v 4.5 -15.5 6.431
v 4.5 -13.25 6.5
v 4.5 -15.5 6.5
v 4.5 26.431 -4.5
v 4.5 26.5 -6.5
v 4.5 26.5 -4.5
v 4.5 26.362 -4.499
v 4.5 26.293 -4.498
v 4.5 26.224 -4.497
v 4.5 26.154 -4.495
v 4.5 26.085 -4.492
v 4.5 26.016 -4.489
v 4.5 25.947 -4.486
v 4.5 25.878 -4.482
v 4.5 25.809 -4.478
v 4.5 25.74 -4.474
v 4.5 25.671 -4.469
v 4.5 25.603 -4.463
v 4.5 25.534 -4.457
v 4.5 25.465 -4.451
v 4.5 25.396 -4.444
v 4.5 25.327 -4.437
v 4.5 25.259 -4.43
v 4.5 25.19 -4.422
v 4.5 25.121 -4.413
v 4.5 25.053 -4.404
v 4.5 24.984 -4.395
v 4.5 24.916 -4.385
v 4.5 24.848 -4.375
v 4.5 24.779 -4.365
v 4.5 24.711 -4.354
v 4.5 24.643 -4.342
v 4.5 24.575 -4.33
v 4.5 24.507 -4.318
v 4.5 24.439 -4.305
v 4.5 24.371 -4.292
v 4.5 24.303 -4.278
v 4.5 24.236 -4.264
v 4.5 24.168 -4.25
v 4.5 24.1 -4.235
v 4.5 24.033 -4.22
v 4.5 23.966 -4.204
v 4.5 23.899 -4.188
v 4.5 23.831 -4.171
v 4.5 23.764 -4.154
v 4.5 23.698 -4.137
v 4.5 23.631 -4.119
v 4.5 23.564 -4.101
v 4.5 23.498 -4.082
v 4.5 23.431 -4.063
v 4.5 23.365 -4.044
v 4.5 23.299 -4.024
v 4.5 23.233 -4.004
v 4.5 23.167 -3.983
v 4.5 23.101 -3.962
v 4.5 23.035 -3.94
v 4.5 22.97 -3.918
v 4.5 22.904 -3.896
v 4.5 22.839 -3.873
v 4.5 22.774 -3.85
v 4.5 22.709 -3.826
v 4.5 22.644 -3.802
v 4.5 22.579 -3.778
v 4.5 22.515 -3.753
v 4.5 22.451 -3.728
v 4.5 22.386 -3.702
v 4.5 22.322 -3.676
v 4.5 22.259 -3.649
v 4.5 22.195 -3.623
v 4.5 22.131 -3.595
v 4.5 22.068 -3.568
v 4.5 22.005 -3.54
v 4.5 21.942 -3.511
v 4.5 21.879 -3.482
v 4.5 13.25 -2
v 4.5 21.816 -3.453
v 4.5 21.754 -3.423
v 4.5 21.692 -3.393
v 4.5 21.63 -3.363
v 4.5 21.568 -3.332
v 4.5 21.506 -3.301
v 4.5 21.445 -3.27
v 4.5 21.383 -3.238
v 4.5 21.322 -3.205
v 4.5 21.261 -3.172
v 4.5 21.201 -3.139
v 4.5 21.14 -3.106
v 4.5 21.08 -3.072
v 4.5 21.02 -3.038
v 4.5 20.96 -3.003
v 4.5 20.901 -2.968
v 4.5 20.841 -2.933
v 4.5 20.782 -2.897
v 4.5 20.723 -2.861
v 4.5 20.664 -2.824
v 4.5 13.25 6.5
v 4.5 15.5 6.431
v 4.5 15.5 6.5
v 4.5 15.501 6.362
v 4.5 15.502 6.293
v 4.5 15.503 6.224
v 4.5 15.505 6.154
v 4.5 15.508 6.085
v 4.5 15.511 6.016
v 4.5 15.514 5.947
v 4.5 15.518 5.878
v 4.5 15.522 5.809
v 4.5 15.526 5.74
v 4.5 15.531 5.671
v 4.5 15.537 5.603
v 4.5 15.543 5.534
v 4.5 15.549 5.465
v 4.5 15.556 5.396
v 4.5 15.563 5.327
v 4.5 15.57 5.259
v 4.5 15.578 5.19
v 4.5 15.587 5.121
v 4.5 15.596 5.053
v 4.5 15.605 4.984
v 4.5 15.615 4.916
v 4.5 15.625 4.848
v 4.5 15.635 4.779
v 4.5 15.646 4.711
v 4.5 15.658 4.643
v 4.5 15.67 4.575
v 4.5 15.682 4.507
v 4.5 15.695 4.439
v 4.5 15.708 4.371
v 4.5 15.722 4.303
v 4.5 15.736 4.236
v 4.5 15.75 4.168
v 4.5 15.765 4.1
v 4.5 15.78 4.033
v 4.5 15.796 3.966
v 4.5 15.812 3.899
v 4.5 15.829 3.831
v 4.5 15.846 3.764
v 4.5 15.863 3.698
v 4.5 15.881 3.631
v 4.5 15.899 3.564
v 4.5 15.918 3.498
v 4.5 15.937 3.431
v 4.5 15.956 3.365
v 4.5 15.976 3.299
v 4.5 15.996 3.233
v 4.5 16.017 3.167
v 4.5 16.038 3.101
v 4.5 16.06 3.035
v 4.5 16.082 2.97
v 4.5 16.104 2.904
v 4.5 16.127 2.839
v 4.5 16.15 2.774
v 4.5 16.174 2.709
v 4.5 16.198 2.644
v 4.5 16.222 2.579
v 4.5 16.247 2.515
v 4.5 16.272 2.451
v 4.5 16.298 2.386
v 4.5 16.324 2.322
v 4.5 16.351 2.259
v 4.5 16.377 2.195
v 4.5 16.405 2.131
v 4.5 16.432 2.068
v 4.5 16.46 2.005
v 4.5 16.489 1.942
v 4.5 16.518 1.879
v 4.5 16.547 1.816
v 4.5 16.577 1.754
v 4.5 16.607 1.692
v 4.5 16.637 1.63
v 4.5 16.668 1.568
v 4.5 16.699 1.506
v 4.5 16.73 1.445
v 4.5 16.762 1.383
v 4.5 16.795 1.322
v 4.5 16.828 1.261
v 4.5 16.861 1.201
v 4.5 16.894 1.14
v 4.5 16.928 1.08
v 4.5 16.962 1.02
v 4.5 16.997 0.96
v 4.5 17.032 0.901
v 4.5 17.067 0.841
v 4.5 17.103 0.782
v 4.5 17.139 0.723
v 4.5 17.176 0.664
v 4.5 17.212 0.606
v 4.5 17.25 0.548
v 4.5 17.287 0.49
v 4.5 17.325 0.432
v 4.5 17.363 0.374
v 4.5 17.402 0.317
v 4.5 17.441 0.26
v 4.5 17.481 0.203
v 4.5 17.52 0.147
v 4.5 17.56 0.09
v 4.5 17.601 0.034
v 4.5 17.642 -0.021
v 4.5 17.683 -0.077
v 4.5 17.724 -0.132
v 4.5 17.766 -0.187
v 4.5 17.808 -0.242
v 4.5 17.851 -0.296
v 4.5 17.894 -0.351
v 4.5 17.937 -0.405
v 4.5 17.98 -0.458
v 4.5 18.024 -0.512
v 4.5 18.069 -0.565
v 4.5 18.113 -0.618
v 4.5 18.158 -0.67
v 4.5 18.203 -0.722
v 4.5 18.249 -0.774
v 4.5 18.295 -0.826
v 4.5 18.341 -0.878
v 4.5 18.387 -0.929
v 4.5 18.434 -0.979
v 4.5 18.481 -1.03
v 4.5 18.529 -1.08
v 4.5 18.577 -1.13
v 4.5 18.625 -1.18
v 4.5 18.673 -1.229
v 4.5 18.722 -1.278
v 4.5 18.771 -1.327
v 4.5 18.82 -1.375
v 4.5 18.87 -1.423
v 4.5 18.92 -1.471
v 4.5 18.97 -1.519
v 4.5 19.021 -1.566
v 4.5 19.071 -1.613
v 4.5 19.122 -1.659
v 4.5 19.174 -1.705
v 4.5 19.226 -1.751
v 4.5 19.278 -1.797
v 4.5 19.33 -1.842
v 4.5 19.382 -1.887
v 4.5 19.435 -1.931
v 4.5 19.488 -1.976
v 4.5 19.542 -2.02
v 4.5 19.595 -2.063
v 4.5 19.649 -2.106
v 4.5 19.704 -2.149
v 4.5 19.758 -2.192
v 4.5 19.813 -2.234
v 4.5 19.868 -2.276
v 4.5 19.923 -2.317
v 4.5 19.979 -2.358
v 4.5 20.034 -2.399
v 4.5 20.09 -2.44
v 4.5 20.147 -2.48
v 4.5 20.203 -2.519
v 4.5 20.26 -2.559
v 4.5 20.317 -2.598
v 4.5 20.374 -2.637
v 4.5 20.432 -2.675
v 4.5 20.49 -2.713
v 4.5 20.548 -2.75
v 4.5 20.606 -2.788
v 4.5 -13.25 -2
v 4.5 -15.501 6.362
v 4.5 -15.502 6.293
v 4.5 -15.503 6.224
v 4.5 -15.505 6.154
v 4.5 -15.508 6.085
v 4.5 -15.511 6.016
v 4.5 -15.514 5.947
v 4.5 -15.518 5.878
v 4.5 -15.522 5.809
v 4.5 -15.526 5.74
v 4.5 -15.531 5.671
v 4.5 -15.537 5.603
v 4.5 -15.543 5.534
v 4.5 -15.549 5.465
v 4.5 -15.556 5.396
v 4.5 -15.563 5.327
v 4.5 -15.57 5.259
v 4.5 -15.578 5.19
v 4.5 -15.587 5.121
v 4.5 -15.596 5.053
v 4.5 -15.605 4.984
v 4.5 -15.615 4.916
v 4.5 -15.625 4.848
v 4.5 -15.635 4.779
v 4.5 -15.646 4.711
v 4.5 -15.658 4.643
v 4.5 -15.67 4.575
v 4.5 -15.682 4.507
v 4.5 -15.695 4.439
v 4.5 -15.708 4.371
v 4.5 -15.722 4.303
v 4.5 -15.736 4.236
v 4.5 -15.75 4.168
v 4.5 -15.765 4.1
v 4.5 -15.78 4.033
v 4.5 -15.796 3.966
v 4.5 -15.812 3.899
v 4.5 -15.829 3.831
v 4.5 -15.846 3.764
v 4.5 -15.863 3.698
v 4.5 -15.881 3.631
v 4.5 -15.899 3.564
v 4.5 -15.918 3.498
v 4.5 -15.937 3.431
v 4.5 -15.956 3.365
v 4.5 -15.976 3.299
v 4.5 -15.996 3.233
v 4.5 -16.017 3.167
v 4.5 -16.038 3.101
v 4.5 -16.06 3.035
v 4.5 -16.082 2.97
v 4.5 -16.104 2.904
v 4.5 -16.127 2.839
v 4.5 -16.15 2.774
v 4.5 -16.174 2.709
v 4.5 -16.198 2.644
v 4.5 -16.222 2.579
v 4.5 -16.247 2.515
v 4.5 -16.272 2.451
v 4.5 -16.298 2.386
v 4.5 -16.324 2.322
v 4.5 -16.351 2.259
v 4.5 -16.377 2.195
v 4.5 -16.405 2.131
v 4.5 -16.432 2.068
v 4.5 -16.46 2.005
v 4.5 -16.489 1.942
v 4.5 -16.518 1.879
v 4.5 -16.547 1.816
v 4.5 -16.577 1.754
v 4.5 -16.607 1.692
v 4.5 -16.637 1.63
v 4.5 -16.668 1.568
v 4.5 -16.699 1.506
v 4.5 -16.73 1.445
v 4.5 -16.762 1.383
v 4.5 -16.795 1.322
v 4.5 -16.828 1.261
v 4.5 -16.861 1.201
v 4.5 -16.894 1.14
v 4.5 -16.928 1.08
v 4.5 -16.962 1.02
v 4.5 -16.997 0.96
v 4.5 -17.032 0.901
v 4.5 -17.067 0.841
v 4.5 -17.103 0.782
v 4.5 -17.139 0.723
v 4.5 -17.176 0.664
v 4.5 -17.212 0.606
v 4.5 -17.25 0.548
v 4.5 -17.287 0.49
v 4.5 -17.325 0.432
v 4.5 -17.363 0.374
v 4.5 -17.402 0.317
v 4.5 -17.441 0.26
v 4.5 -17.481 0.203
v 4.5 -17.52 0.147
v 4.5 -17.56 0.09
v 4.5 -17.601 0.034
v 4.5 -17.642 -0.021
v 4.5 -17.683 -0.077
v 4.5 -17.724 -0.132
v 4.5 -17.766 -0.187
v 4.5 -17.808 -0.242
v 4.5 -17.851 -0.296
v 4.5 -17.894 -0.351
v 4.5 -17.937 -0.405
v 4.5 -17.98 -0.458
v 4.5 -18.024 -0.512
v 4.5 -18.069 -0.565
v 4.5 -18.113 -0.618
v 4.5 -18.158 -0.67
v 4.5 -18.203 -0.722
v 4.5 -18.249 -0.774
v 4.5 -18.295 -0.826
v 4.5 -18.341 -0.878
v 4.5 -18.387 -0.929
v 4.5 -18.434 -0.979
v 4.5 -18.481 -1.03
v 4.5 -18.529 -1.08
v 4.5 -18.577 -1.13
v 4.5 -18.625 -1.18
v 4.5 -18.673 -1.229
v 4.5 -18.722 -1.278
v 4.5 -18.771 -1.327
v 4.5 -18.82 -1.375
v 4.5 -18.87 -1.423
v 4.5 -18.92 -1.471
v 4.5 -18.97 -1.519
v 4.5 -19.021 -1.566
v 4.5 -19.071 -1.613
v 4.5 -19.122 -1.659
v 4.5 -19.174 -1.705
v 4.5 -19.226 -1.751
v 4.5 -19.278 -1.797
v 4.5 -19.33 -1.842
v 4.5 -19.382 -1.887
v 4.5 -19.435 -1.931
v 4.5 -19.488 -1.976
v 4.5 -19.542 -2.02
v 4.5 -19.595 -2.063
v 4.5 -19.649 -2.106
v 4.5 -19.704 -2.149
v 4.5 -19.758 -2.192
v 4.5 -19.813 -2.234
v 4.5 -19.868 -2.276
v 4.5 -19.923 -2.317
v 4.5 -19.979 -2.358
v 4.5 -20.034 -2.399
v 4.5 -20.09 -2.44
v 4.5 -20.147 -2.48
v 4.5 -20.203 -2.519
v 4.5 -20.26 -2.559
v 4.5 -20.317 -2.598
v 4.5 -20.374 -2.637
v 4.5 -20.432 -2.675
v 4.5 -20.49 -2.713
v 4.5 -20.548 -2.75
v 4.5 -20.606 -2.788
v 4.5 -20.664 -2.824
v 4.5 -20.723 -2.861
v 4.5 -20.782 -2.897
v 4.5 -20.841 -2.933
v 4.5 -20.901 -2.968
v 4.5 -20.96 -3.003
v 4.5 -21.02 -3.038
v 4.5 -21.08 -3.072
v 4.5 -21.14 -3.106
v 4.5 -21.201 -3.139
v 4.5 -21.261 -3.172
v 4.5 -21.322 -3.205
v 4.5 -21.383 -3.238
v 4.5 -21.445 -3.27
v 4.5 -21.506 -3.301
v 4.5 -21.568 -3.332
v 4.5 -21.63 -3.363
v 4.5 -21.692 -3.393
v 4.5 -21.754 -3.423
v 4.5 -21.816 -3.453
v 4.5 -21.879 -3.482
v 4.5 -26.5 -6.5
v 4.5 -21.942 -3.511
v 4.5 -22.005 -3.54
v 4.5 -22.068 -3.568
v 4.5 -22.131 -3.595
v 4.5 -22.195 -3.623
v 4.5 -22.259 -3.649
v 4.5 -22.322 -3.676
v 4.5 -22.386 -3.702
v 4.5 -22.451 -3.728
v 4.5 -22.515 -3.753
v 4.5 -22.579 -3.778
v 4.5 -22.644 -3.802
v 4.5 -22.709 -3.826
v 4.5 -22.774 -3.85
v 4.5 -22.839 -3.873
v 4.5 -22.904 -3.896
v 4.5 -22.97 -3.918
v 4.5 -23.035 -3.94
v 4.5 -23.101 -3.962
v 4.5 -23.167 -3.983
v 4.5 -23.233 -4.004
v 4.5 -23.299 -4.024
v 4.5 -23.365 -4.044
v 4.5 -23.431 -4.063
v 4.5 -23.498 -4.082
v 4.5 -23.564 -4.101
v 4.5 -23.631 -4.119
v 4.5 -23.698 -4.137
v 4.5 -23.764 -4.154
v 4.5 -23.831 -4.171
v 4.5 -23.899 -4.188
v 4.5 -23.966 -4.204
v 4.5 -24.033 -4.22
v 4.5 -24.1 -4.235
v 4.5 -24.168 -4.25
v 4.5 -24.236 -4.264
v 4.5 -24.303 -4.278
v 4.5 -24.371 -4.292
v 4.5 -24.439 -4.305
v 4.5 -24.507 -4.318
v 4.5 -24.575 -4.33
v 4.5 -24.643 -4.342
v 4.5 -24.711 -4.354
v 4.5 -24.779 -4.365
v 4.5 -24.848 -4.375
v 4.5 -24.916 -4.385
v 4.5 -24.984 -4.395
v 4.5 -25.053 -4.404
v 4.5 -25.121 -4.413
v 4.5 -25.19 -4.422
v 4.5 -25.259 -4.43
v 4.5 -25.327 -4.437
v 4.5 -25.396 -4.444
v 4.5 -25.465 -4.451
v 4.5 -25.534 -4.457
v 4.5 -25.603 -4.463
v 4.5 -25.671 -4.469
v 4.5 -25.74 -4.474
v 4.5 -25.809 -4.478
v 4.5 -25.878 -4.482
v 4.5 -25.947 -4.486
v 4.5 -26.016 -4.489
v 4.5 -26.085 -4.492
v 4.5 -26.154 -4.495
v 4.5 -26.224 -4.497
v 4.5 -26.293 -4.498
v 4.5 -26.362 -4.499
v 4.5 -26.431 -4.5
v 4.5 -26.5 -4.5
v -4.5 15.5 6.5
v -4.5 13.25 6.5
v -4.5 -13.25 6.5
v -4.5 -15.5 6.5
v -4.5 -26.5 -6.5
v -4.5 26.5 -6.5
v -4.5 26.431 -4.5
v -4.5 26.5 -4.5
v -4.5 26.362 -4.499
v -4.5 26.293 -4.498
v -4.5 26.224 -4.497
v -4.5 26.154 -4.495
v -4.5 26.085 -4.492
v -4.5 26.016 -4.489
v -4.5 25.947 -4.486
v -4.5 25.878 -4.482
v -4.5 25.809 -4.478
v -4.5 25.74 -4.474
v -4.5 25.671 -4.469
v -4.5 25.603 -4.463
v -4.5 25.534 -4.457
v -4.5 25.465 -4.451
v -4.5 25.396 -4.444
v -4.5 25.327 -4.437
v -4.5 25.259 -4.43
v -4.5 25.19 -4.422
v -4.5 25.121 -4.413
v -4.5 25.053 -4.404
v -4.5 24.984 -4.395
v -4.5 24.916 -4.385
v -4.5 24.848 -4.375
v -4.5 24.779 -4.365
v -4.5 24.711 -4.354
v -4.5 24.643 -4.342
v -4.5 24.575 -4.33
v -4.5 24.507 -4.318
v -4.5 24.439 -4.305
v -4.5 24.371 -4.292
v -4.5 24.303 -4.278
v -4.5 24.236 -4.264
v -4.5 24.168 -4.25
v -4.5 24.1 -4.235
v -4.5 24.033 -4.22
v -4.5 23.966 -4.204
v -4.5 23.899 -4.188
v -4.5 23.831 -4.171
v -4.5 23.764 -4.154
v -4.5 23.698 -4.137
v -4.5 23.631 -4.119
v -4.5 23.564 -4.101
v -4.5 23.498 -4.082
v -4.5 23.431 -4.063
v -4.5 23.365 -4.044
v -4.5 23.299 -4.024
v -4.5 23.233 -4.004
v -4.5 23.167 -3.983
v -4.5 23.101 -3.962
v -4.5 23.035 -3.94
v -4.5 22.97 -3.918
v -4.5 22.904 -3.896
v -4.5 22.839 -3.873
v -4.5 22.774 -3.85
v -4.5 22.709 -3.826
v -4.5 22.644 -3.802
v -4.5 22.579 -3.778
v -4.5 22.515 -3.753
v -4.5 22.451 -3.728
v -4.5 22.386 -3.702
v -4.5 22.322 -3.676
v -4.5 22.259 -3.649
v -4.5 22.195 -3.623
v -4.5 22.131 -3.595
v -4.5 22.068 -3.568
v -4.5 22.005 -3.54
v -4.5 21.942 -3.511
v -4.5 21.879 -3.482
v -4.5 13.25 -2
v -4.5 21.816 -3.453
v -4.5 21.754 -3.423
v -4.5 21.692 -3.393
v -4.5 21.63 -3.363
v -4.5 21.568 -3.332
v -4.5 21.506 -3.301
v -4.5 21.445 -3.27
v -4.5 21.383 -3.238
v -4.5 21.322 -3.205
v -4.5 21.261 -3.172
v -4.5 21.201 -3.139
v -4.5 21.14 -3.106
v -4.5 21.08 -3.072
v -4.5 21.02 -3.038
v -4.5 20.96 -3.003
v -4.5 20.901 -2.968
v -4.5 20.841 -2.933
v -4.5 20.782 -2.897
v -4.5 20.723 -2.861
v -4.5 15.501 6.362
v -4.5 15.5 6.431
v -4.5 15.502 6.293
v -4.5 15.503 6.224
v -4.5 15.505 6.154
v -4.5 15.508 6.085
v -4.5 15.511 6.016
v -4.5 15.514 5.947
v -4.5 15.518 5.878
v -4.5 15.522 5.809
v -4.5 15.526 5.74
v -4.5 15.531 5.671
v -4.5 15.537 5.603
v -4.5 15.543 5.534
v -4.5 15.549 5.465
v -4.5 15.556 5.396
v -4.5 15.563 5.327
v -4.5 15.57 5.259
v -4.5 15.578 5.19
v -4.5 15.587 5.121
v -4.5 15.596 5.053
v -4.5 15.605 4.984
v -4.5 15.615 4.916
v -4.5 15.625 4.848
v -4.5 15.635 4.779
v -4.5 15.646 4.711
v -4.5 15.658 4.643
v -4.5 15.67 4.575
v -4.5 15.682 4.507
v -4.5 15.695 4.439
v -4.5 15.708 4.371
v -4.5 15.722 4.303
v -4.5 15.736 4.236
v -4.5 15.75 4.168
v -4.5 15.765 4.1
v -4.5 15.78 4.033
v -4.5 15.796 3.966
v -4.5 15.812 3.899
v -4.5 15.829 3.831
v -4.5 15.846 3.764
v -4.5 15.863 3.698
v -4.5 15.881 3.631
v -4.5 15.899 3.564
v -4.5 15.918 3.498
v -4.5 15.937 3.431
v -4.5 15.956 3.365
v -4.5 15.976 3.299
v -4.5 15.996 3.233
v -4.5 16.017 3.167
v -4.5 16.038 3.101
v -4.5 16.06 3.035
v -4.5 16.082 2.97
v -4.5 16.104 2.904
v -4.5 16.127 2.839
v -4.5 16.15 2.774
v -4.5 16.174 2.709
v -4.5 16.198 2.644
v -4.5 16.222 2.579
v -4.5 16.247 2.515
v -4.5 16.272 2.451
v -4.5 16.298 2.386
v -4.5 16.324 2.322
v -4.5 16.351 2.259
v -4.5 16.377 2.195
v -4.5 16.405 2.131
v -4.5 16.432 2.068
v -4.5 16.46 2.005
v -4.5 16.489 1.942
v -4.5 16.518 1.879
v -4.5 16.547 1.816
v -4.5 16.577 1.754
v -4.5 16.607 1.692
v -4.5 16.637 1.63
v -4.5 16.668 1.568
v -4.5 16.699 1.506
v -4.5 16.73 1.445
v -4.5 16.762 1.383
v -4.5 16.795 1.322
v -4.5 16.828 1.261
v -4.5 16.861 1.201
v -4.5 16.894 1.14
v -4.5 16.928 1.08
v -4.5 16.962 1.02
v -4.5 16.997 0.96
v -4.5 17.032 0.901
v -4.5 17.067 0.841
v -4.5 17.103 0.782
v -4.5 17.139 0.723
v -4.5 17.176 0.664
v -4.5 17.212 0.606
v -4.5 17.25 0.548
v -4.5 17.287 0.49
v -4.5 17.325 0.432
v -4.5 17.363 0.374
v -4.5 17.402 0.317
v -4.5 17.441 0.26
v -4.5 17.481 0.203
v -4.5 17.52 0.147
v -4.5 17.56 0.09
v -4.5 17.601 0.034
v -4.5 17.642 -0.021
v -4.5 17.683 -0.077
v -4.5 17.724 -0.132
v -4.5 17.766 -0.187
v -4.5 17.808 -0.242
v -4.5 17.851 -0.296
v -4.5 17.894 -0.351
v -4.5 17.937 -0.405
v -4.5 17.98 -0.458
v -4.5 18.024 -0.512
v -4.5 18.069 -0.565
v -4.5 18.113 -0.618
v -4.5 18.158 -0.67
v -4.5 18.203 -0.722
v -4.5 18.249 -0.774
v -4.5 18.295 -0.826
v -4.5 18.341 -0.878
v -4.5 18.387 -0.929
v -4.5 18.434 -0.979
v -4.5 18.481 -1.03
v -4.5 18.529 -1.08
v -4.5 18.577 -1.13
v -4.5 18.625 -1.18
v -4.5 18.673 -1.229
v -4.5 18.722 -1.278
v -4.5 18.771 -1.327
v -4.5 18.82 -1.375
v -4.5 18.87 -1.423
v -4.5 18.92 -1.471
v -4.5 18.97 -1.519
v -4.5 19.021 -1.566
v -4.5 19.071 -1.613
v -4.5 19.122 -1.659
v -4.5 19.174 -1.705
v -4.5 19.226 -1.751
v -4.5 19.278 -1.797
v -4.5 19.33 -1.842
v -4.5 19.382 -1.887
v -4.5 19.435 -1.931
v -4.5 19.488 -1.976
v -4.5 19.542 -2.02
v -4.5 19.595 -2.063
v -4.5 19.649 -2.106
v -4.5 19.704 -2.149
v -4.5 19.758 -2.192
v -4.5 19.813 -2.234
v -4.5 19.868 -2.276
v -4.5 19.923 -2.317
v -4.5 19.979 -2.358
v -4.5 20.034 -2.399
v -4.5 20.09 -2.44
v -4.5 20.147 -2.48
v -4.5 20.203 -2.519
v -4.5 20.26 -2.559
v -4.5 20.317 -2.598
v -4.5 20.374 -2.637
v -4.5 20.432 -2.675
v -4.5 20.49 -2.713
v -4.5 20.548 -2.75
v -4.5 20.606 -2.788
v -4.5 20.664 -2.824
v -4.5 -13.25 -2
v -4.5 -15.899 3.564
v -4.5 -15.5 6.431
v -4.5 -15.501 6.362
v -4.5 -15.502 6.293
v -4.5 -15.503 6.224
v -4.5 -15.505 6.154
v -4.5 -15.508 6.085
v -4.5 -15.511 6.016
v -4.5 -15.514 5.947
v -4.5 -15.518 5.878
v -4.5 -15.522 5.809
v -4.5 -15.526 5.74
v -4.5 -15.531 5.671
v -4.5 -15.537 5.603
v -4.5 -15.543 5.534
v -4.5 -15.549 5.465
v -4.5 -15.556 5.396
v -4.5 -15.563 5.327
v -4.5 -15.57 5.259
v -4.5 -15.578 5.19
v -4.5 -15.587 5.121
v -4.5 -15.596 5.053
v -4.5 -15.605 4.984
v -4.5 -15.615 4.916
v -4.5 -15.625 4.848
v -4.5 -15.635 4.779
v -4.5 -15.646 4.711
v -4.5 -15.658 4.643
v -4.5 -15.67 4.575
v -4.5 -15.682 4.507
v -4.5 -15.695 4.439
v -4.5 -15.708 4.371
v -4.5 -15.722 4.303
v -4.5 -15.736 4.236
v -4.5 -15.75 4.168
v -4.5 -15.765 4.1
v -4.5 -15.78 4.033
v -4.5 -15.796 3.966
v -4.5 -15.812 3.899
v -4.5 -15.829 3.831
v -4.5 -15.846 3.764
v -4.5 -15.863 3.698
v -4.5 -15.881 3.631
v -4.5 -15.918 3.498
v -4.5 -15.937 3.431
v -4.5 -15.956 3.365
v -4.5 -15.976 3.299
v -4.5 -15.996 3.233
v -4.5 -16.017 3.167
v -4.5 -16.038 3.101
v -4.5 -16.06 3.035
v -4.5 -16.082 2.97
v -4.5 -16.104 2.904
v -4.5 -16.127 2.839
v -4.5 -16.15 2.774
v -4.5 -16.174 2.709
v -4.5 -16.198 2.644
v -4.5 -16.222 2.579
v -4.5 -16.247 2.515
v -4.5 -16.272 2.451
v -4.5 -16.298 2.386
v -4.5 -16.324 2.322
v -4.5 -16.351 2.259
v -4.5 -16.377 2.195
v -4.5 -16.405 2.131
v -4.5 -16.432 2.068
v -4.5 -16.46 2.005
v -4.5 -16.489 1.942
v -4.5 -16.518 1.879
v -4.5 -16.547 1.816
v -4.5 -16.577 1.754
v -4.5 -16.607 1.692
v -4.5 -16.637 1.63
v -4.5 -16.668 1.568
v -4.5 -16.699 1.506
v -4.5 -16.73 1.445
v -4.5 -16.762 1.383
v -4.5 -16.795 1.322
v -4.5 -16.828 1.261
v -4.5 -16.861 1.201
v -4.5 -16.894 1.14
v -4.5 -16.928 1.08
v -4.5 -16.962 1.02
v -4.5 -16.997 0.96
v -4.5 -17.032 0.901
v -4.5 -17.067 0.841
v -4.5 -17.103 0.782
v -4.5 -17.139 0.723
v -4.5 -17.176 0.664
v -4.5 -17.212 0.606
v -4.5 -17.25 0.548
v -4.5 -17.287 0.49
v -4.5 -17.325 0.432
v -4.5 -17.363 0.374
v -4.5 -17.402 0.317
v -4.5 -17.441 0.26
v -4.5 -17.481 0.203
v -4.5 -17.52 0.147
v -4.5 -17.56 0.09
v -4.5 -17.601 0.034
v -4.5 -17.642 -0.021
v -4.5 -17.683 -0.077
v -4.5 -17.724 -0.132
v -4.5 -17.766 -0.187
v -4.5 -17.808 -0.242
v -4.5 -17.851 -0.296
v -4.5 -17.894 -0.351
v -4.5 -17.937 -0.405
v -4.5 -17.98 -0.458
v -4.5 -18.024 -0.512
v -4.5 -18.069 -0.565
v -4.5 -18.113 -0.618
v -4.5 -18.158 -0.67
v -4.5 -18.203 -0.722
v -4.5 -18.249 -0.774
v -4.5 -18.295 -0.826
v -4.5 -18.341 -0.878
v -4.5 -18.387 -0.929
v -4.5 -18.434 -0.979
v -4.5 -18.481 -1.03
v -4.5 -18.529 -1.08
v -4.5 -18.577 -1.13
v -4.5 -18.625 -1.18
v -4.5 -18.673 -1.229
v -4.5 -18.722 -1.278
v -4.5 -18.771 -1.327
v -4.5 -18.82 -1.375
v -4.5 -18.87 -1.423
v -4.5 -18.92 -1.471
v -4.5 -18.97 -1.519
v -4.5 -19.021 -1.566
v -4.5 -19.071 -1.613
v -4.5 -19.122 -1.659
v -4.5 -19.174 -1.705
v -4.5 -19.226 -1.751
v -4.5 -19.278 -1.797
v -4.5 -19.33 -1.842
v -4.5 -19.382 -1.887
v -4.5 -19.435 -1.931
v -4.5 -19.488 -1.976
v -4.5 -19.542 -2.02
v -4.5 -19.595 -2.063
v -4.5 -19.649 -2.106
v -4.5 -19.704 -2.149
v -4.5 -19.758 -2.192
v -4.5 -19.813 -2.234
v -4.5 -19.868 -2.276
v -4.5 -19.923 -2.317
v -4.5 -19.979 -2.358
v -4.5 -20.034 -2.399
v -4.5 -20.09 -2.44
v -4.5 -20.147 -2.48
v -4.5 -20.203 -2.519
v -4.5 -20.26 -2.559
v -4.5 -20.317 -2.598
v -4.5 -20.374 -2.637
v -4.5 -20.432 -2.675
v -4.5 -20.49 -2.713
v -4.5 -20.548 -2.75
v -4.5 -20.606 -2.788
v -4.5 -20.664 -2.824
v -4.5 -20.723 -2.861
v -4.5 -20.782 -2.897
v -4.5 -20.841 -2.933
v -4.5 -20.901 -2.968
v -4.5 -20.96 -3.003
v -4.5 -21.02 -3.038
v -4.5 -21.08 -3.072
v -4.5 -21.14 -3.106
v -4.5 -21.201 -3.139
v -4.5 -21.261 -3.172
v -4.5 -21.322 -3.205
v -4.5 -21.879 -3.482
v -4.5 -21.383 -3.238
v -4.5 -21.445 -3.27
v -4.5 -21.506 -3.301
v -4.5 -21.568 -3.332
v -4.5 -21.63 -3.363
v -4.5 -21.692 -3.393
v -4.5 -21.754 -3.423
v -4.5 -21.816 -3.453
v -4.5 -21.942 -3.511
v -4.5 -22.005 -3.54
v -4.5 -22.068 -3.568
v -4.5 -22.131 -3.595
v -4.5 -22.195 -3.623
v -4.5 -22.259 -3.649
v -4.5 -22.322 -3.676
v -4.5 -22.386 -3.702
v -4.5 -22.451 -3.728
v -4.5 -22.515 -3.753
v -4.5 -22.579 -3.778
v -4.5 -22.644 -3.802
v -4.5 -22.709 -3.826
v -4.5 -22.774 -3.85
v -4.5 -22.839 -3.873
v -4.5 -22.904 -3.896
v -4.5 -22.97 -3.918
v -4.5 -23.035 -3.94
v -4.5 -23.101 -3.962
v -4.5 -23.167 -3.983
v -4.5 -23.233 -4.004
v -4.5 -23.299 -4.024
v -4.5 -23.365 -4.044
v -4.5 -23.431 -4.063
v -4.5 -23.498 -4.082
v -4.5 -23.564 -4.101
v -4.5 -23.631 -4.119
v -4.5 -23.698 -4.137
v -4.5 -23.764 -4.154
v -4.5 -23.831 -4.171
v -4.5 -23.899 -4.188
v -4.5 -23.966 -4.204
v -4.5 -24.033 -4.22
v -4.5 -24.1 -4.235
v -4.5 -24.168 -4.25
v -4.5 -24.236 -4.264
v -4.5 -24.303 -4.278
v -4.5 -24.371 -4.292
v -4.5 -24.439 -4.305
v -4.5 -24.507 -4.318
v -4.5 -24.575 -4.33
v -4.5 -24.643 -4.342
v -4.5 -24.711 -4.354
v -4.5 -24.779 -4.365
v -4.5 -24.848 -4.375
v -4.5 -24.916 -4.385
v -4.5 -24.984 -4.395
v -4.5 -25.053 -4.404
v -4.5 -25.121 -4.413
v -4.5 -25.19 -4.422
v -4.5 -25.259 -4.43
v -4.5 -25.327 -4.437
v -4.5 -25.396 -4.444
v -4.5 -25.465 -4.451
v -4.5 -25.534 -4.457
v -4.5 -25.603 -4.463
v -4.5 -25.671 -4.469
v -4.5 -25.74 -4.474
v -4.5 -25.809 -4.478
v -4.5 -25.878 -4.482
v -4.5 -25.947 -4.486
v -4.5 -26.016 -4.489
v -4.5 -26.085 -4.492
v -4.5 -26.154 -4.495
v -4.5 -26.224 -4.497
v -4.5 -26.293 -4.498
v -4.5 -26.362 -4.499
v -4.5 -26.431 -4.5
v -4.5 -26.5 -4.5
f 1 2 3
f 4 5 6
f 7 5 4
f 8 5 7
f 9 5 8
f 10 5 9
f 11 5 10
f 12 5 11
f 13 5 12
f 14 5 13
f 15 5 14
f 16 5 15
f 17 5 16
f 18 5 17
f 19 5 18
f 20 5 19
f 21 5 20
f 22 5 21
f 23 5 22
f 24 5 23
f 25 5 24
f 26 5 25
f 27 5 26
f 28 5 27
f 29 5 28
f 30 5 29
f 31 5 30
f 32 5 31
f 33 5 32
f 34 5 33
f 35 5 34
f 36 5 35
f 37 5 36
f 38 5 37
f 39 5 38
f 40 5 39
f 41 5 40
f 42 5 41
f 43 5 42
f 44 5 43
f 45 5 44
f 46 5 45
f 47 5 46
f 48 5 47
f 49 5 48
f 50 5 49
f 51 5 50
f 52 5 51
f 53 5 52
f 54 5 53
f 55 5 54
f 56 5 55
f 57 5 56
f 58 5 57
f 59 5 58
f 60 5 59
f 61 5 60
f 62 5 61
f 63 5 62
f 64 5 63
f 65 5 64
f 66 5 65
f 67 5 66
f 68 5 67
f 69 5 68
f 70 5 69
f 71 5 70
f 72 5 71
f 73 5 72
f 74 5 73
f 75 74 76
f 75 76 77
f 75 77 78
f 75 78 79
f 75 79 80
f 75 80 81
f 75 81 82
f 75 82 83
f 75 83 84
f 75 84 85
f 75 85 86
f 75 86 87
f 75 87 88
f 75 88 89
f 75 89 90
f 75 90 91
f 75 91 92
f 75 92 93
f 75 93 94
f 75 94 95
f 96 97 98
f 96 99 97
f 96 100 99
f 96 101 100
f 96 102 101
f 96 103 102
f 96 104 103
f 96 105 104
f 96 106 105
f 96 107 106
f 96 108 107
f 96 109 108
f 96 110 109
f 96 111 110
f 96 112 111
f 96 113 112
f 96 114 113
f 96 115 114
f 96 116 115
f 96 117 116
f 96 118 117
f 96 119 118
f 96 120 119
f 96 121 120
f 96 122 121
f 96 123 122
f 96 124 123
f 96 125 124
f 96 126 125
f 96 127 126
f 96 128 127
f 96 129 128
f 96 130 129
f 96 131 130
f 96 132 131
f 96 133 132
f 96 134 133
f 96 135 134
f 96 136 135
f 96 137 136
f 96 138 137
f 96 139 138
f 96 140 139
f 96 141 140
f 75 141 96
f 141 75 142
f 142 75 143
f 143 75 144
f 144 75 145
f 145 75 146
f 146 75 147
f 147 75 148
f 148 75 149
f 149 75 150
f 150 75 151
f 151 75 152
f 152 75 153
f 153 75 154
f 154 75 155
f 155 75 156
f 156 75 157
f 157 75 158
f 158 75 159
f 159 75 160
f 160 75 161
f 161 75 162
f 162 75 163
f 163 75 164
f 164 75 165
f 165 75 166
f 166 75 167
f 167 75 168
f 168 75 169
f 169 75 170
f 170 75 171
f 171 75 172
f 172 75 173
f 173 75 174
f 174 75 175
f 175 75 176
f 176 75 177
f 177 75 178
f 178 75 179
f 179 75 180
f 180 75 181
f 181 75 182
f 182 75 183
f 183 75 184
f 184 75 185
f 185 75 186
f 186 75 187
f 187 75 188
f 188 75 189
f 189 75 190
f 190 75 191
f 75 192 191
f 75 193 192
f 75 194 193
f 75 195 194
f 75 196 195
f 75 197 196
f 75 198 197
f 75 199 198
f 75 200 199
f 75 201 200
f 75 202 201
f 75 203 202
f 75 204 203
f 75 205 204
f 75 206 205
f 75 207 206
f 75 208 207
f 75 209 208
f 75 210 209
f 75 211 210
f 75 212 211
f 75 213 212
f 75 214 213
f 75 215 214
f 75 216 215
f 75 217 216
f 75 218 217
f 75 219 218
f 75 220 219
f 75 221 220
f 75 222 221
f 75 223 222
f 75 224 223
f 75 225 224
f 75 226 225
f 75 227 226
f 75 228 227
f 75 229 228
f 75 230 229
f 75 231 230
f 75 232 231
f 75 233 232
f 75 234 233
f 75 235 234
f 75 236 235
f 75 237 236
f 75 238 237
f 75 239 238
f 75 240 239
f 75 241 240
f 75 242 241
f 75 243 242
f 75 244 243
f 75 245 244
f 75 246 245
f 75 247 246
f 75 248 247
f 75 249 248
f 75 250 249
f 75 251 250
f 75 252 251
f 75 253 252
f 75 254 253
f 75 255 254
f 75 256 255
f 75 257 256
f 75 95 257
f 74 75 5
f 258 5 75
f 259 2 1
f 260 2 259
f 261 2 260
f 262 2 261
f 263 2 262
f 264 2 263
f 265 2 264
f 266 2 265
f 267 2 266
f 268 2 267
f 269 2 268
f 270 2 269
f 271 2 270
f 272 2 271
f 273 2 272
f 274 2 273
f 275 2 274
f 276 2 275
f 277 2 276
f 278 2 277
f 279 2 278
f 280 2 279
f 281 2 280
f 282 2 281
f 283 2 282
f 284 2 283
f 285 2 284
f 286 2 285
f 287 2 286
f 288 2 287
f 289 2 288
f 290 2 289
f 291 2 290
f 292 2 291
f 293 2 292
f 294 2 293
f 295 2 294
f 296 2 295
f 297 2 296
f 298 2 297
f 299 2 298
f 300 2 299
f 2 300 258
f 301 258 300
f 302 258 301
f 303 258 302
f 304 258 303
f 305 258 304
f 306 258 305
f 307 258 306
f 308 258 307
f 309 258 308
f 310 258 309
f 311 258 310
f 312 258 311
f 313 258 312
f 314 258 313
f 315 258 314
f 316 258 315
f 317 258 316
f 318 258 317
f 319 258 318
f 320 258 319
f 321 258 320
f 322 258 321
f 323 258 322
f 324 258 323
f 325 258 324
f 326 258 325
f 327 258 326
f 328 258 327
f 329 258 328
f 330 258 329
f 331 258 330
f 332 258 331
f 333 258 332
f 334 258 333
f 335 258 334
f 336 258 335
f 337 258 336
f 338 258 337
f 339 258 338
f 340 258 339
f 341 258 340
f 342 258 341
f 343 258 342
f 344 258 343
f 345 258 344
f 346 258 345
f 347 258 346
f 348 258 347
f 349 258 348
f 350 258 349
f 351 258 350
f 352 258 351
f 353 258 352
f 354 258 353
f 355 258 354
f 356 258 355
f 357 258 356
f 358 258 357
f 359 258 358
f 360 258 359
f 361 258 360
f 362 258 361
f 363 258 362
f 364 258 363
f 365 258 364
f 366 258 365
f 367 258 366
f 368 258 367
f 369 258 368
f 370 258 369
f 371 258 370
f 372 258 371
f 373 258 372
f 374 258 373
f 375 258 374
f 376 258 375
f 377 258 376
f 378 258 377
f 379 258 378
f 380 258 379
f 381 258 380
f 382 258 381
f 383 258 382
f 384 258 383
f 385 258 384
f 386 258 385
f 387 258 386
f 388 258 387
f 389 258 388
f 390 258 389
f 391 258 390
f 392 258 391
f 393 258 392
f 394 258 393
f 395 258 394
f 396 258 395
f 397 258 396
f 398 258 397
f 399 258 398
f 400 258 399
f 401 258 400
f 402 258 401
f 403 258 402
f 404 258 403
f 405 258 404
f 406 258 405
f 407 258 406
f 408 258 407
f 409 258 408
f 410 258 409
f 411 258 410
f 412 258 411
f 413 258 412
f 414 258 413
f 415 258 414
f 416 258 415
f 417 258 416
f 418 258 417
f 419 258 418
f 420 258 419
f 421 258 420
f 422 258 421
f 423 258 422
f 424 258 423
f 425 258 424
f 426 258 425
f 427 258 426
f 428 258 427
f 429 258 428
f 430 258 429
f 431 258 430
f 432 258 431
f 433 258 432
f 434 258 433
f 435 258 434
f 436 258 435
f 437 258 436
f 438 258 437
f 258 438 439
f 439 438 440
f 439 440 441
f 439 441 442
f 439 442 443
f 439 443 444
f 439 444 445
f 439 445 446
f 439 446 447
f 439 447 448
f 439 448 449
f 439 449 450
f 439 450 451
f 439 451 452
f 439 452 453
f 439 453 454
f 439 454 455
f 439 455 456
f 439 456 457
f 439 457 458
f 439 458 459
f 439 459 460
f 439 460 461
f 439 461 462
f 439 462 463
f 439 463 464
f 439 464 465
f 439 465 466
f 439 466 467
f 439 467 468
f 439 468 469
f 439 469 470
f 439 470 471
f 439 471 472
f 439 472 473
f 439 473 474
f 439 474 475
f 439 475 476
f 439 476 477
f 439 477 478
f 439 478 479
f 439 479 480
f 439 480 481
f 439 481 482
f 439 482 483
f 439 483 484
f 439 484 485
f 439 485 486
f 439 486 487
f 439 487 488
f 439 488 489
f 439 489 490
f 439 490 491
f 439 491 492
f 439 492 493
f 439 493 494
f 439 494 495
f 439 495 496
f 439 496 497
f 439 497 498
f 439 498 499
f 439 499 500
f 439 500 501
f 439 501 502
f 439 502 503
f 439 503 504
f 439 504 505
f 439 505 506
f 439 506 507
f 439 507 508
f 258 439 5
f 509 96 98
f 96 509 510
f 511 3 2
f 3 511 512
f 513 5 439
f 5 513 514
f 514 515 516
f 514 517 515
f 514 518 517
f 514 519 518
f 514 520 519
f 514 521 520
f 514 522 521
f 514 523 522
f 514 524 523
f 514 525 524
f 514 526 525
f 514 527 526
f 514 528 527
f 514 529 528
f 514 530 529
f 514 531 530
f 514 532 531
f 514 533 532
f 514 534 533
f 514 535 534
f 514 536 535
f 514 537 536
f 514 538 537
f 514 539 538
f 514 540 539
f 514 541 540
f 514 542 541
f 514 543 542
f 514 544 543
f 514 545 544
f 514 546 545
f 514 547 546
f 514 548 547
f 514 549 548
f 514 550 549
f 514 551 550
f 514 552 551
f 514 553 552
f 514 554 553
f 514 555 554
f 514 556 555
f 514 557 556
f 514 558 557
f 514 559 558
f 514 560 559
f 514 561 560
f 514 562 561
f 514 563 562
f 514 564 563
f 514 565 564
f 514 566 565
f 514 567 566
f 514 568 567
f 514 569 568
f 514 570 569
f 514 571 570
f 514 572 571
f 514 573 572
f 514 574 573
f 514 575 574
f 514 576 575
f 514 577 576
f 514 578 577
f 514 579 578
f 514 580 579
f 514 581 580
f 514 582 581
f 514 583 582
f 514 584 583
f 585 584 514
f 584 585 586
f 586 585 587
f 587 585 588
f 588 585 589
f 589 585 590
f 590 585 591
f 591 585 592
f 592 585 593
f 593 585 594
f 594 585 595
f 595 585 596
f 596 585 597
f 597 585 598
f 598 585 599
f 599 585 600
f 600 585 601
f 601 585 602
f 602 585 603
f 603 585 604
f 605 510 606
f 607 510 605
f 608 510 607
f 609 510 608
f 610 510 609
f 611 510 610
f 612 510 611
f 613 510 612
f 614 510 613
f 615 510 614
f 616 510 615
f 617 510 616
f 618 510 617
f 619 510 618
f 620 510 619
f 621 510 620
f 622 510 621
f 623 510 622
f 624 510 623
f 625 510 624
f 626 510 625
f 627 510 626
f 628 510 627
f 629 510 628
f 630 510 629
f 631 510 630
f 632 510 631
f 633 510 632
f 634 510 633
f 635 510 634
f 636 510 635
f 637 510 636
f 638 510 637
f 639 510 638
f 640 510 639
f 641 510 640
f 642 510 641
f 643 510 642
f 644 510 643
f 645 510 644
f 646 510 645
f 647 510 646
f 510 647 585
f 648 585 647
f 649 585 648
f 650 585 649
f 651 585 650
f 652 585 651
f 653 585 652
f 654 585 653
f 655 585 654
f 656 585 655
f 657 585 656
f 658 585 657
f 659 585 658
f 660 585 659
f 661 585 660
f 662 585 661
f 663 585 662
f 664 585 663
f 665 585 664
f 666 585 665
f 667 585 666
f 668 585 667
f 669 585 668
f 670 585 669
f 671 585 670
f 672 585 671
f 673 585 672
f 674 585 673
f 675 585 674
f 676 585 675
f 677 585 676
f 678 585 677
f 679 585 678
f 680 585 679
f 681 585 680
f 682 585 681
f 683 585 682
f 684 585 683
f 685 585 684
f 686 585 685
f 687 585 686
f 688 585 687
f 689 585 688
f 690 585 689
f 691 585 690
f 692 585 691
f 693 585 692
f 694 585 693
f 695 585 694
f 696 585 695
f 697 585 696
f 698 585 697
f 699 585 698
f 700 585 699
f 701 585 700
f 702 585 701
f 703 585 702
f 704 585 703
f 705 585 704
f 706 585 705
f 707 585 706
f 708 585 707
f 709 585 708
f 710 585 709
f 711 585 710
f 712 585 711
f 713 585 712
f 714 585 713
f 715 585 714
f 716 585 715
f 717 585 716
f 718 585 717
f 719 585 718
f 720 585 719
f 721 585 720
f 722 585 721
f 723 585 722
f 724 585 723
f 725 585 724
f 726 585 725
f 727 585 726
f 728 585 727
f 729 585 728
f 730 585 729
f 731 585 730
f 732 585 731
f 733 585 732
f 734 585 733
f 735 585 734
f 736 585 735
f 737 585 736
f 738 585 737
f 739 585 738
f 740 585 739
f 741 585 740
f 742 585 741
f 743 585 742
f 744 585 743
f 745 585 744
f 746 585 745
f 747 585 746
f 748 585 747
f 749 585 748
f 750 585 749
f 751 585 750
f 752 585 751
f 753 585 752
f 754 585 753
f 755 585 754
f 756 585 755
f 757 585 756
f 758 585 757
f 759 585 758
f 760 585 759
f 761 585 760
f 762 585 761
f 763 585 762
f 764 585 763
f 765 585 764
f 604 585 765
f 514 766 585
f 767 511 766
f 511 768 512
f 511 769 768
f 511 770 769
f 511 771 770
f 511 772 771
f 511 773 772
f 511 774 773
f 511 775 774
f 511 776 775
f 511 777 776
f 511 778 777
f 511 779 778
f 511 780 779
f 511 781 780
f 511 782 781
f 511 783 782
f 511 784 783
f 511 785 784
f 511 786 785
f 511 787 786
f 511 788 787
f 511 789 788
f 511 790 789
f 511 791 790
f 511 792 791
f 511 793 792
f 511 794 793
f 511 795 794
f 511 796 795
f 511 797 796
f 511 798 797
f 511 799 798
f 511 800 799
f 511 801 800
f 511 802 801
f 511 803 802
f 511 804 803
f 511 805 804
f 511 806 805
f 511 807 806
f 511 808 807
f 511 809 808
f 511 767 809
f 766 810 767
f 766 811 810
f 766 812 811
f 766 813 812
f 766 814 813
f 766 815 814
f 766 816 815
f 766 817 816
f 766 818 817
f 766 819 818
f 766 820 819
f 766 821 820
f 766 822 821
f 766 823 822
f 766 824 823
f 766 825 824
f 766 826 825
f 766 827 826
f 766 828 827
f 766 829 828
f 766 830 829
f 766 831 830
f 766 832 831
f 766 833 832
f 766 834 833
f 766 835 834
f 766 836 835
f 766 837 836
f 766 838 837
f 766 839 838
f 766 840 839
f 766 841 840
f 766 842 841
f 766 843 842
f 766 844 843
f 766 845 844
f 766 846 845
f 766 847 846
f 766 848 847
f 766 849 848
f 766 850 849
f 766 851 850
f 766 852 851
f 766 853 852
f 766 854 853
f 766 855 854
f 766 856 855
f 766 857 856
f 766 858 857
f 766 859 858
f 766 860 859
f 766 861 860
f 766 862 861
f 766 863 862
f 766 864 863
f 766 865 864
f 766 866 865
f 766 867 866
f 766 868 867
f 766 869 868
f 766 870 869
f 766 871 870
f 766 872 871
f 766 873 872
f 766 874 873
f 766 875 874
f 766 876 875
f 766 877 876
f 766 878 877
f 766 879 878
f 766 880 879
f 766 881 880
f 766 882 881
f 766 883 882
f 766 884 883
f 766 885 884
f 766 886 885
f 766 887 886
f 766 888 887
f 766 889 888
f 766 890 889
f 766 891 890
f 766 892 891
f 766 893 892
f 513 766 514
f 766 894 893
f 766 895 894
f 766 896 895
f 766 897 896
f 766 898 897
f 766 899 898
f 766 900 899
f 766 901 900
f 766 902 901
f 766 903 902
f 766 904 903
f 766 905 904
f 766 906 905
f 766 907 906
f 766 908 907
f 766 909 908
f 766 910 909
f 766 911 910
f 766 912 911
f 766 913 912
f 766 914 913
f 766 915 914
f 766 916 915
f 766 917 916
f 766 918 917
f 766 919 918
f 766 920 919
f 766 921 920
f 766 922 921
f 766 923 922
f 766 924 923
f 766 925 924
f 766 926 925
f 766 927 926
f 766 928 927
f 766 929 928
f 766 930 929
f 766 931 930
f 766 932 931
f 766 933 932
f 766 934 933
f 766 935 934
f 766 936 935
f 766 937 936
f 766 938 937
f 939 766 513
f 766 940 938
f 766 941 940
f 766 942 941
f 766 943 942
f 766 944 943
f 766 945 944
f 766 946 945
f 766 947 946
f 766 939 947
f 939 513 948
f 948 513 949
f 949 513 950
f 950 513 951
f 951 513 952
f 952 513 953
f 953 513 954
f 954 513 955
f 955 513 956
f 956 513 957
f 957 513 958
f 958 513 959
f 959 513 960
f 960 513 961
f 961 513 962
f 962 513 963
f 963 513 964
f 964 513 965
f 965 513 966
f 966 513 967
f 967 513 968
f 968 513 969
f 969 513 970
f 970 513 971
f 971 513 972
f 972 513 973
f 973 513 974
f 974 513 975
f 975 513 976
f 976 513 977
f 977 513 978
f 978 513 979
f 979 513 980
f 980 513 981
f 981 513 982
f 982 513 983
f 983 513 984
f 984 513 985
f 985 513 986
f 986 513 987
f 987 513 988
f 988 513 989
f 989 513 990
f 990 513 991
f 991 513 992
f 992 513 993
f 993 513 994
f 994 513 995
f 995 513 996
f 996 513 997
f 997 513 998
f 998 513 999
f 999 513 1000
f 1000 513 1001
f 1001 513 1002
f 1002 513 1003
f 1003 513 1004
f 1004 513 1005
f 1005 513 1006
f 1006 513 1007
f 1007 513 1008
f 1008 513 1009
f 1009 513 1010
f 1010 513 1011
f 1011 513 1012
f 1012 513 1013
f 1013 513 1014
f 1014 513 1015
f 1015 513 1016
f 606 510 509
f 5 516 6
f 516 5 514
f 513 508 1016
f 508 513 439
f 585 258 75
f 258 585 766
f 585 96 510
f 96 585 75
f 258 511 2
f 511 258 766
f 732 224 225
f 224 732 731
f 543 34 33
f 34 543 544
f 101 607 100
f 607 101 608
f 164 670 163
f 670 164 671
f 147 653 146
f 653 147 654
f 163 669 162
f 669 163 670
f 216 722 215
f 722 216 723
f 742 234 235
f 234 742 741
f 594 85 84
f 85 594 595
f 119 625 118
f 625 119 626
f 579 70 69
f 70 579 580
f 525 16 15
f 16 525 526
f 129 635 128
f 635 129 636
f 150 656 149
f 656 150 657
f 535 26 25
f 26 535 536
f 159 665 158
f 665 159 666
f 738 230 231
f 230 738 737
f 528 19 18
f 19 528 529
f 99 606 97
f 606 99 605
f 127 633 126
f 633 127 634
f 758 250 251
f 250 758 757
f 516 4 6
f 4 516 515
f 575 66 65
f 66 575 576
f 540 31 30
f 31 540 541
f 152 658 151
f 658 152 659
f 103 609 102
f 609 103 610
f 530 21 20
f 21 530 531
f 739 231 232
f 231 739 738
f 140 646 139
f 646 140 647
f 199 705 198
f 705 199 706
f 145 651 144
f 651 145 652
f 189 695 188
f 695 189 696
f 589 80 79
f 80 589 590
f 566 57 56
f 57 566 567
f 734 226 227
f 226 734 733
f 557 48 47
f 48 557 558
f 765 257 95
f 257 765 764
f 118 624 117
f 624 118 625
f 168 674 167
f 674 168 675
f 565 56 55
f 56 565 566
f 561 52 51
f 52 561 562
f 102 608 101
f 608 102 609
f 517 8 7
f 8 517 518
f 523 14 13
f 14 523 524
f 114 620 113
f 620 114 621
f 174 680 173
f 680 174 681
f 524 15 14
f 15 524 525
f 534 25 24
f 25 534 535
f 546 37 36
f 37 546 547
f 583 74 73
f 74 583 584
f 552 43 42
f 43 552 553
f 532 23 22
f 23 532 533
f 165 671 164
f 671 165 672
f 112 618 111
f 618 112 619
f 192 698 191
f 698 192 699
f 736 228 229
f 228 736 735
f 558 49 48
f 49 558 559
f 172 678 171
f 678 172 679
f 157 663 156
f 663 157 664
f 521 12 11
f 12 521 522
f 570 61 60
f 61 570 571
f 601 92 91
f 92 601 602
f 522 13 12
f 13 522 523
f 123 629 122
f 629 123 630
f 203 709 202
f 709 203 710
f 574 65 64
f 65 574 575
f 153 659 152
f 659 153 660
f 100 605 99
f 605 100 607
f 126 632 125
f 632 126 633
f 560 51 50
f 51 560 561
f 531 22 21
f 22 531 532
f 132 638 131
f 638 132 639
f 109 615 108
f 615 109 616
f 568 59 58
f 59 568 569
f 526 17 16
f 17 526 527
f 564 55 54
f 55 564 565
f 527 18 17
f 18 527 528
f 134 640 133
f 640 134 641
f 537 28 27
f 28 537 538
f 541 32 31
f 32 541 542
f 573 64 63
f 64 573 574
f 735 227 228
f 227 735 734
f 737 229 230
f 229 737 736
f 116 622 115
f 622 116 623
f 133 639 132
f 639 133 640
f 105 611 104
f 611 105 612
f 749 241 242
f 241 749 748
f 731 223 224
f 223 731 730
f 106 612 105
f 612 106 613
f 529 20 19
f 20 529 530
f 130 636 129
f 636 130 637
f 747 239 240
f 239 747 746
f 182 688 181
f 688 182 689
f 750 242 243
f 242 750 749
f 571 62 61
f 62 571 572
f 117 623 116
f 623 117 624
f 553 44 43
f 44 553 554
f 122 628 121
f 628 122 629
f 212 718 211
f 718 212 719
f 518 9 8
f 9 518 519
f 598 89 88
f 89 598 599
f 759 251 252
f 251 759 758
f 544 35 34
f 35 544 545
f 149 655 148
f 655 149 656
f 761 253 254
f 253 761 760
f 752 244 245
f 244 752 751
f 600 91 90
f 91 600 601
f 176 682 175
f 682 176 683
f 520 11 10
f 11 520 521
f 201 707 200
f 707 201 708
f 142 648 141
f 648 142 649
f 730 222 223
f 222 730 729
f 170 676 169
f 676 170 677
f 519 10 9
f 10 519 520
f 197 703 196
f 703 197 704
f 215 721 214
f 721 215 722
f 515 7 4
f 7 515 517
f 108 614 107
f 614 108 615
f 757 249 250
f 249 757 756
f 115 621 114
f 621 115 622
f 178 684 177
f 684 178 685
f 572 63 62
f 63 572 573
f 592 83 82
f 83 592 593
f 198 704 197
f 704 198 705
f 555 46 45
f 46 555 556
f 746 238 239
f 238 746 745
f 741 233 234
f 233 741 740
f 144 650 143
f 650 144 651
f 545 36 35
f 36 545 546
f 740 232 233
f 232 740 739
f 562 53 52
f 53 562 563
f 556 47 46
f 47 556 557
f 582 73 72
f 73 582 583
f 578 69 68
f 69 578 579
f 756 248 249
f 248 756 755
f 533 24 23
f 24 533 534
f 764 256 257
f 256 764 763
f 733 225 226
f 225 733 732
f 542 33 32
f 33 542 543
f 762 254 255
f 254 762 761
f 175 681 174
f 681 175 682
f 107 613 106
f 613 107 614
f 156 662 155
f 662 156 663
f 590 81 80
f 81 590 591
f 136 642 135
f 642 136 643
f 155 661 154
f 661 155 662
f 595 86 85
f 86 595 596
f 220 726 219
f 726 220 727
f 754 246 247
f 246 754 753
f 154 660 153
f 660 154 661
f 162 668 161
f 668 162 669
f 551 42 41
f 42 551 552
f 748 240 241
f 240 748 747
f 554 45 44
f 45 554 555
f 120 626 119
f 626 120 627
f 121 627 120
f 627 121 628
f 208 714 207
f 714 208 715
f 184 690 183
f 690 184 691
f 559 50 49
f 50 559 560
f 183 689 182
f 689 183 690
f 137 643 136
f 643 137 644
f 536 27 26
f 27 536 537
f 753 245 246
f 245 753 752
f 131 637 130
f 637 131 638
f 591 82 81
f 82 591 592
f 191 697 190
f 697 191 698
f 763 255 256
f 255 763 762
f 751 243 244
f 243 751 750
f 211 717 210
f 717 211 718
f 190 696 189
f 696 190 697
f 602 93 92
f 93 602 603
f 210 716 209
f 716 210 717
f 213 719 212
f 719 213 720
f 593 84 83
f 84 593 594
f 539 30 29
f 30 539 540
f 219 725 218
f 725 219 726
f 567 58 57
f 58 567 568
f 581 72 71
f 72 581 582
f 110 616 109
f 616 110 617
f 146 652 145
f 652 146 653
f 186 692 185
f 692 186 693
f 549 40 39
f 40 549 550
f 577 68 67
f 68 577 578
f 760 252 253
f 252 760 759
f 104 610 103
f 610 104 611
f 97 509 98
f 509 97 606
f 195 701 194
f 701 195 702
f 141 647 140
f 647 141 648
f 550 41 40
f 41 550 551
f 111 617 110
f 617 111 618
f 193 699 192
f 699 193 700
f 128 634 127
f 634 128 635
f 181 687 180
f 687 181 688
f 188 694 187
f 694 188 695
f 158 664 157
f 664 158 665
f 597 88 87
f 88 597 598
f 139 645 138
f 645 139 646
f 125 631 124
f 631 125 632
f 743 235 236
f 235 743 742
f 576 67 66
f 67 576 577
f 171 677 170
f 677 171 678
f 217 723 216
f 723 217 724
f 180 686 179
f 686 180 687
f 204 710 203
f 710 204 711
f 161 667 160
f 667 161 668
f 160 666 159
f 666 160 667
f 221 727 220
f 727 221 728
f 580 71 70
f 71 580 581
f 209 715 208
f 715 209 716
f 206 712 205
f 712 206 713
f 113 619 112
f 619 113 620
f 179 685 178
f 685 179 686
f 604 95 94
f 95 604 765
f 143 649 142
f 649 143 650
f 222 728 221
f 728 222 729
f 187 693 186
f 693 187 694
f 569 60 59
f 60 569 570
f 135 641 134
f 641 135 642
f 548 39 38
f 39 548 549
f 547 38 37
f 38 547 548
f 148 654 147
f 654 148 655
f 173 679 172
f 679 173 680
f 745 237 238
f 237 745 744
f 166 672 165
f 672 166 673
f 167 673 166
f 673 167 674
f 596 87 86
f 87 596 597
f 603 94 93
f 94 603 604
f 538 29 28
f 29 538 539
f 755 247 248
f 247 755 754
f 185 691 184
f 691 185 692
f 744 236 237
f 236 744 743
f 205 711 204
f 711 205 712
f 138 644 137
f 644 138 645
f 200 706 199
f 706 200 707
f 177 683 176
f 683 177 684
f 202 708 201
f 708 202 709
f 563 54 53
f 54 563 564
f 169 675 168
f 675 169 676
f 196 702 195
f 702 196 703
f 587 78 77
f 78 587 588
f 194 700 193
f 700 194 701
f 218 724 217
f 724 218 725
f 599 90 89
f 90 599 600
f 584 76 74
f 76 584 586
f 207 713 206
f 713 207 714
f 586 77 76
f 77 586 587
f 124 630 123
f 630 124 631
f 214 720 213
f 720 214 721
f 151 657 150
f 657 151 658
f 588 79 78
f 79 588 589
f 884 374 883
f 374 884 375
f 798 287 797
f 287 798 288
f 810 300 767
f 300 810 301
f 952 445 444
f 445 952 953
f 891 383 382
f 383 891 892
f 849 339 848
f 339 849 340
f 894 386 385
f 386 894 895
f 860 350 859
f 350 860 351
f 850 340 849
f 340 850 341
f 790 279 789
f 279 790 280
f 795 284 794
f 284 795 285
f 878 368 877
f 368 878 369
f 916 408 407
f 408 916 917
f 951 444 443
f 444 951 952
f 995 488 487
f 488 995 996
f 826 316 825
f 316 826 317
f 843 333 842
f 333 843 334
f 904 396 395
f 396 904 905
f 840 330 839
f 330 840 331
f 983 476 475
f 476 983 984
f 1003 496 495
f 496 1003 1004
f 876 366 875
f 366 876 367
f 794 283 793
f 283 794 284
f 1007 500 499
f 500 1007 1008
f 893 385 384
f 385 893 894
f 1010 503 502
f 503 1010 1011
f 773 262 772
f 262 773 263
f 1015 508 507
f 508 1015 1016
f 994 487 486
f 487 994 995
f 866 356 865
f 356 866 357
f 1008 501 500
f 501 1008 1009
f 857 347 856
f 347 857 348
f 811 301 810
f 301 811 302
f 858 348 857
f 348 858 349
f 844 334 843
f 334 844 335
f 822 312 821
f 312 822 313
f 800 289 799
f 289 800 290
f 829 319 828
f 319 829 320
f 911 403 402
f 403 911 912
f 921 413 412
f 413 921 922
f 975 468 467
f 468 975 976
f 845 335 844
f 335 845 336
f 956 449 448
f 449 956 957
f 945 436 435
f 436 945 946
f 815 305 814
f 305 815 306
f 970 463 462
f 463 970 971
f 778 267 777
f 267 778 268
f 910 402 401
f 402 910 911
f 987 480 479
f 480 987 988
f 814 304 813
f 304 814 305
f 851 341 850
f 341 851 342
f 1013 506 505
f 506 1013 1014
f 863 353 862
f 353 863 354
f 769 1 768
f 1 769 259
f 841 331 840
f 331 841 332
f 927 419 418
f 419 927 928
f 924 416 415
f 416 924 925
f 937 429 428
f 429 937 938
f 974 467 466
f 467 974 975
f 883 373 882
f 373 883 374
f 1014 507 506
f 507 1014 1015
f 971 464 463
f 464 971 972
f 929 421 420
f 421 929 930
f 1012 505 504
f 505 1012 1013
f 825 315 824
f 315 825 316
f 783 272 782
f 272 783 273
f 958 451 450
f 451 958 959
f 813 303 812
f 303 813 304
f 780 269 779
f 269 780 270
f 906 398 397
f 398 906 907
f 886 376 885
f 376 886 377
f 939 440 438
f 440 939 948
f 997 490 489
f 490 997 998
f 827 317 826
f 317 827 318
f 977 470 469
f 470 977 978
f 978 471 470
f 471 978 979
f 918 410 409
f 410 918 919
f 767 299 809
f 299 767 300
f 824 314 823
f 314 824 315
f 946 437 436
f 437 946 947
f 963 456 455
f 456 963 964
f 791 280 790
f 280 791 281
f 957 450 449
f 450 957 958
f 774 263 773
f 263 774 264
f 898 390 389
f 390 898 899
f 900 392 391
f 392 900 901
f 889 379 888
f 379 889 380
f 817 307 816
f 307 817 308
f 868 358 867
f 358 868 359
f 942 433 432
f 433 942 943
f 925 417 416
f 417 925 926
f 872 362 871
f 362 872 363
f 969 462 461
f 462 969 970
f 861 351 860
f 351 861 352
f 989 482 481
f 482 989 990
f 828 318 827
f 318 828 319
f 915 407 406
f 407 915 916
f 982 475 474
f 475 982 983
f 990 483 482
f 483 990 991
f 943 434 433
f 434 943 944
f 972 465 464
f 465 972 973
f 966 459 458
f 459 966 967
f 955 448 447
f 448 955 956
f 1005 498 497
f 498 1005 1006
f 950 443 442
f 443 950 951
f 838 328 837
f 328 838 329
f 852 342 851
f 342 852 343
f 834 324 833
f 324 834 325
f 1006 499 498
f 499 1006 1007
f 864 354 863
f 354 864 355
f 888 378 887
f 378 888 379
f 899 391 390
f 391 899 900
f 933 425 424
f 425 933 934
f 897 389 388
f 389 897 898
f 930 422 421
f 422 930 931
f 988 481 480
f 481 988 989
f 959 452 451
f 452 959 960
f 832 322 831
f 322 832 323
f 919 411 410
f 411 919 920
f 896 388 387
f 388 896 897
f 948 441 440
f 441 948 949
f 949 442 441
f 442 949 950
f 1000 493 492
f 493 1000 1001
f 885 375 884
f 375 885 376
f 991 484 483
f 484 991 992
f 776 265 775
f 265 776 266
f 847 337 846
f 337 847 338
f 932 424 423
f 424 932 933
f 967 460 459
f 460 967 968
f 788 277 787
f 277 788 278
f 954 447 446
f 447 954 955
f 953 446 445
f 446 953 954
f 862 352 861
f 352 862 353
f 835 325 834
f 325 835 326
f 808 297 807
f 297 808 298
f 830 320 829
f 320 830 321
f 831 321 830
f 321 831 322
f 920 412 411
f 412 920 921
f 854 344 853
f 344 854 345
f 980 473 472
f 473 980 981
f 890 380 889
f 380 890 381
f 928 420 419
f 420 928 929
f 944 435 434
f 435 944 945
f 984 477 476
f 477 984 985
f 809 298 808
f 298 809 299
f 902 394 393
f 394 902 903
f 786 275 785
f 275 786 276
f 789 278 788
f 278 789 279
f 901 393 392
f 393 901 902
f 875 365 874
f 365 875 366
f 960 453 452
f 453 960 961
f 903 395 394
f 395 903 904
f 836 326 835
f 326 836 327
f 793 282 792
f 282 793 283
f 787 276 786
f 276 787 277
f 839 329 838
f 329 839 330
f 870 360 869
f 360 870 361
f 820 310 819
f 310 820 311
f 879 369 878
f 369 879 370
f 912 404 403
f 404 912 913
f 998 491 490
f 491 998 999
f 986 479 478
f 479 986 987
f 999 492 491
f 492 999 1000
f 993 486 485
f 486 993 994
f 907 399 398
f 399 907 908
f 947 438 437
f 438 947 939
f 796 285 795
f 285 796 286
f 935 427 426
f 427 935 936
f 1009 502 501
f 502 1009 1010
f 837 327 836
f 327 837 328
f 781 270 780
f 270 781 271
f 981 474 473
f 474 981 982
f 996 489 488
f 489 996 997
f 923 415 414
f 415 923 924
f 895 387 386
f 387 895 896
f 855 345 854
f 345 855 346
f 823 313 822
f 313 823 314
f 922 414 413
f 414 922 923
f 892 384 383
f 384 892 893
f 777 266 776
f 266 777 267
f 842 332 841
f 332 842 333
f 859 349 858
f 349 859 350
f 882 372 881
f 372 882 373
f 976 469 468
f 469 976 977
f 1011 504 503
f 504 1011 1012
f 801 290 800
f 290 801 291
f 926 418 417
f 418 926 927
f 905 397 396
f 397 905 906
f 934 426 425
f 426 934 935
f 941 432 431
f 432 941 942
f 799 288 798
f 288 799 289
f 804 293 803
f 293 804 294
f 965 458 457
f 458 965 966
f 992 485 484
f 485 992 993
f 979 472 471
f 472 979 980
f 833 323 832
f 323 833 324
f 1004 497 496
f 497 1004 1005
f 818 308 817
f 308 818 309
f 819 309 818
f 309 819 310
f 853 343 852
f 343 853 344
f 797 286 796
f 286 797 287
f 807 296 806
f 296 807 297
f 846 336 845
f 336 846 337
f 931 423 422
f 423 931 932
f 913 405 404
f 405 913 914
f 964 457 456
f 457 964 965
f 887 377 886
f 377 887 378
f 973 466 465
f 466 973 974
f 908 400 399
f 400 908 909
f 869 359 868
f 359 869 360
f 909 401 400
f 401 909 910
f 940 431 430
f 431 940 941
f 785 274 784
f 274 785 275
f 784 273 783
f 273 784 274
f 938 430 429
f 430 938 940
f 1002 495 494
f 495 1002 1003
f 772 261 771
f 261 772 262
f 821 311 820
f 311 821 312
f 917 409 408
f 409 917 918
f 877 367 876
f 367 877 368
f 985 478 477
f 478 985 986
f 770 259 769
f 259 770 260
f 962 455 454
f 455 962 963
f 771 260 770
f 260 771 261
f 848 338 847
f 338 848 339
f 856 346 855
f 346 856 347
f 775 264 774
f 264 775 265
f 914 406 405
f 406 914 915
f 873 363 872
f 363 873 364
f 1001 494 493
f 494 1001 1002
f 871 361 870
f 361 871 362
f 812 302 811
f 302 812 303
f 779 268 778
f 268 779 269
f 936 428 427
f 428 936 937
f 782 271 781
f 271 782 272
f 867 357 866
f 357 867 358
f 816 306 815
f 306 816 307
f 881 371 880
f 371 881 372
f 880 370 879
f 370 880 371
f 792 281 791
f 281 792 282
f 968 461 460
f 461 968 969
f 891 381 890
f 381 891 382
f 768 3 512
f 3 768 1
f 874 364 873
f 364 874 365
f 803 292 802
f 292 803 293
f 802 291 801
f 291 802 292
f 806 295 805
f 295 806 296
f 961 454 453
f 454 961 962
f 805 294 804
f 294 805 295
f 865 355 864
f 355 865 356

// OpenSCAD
render (convexity=1) {
  difference () {
    difference () {
      cube ([9, 53.0, 13], center=true);
      translate ([0, 0, 3]) {
        cube ([10, 26.5, 10], center=true);
      }
    }
    rotate ([0.0,90.0,0.0]) {
      translate ([-13/2, 26.5, 0]) {
        cylinder ($fn=1000, h=11, r=11, center=true);
      }
    }
    mirror ([0, 1, 0]) {
      rotate ([0.0,90.0,0.0]) {
        translate ([-13/2, 26.5, 0]) {
          cylinder ($fn=1000, h=11, r=11, center=true);
        }
      }
    }
  }
}
